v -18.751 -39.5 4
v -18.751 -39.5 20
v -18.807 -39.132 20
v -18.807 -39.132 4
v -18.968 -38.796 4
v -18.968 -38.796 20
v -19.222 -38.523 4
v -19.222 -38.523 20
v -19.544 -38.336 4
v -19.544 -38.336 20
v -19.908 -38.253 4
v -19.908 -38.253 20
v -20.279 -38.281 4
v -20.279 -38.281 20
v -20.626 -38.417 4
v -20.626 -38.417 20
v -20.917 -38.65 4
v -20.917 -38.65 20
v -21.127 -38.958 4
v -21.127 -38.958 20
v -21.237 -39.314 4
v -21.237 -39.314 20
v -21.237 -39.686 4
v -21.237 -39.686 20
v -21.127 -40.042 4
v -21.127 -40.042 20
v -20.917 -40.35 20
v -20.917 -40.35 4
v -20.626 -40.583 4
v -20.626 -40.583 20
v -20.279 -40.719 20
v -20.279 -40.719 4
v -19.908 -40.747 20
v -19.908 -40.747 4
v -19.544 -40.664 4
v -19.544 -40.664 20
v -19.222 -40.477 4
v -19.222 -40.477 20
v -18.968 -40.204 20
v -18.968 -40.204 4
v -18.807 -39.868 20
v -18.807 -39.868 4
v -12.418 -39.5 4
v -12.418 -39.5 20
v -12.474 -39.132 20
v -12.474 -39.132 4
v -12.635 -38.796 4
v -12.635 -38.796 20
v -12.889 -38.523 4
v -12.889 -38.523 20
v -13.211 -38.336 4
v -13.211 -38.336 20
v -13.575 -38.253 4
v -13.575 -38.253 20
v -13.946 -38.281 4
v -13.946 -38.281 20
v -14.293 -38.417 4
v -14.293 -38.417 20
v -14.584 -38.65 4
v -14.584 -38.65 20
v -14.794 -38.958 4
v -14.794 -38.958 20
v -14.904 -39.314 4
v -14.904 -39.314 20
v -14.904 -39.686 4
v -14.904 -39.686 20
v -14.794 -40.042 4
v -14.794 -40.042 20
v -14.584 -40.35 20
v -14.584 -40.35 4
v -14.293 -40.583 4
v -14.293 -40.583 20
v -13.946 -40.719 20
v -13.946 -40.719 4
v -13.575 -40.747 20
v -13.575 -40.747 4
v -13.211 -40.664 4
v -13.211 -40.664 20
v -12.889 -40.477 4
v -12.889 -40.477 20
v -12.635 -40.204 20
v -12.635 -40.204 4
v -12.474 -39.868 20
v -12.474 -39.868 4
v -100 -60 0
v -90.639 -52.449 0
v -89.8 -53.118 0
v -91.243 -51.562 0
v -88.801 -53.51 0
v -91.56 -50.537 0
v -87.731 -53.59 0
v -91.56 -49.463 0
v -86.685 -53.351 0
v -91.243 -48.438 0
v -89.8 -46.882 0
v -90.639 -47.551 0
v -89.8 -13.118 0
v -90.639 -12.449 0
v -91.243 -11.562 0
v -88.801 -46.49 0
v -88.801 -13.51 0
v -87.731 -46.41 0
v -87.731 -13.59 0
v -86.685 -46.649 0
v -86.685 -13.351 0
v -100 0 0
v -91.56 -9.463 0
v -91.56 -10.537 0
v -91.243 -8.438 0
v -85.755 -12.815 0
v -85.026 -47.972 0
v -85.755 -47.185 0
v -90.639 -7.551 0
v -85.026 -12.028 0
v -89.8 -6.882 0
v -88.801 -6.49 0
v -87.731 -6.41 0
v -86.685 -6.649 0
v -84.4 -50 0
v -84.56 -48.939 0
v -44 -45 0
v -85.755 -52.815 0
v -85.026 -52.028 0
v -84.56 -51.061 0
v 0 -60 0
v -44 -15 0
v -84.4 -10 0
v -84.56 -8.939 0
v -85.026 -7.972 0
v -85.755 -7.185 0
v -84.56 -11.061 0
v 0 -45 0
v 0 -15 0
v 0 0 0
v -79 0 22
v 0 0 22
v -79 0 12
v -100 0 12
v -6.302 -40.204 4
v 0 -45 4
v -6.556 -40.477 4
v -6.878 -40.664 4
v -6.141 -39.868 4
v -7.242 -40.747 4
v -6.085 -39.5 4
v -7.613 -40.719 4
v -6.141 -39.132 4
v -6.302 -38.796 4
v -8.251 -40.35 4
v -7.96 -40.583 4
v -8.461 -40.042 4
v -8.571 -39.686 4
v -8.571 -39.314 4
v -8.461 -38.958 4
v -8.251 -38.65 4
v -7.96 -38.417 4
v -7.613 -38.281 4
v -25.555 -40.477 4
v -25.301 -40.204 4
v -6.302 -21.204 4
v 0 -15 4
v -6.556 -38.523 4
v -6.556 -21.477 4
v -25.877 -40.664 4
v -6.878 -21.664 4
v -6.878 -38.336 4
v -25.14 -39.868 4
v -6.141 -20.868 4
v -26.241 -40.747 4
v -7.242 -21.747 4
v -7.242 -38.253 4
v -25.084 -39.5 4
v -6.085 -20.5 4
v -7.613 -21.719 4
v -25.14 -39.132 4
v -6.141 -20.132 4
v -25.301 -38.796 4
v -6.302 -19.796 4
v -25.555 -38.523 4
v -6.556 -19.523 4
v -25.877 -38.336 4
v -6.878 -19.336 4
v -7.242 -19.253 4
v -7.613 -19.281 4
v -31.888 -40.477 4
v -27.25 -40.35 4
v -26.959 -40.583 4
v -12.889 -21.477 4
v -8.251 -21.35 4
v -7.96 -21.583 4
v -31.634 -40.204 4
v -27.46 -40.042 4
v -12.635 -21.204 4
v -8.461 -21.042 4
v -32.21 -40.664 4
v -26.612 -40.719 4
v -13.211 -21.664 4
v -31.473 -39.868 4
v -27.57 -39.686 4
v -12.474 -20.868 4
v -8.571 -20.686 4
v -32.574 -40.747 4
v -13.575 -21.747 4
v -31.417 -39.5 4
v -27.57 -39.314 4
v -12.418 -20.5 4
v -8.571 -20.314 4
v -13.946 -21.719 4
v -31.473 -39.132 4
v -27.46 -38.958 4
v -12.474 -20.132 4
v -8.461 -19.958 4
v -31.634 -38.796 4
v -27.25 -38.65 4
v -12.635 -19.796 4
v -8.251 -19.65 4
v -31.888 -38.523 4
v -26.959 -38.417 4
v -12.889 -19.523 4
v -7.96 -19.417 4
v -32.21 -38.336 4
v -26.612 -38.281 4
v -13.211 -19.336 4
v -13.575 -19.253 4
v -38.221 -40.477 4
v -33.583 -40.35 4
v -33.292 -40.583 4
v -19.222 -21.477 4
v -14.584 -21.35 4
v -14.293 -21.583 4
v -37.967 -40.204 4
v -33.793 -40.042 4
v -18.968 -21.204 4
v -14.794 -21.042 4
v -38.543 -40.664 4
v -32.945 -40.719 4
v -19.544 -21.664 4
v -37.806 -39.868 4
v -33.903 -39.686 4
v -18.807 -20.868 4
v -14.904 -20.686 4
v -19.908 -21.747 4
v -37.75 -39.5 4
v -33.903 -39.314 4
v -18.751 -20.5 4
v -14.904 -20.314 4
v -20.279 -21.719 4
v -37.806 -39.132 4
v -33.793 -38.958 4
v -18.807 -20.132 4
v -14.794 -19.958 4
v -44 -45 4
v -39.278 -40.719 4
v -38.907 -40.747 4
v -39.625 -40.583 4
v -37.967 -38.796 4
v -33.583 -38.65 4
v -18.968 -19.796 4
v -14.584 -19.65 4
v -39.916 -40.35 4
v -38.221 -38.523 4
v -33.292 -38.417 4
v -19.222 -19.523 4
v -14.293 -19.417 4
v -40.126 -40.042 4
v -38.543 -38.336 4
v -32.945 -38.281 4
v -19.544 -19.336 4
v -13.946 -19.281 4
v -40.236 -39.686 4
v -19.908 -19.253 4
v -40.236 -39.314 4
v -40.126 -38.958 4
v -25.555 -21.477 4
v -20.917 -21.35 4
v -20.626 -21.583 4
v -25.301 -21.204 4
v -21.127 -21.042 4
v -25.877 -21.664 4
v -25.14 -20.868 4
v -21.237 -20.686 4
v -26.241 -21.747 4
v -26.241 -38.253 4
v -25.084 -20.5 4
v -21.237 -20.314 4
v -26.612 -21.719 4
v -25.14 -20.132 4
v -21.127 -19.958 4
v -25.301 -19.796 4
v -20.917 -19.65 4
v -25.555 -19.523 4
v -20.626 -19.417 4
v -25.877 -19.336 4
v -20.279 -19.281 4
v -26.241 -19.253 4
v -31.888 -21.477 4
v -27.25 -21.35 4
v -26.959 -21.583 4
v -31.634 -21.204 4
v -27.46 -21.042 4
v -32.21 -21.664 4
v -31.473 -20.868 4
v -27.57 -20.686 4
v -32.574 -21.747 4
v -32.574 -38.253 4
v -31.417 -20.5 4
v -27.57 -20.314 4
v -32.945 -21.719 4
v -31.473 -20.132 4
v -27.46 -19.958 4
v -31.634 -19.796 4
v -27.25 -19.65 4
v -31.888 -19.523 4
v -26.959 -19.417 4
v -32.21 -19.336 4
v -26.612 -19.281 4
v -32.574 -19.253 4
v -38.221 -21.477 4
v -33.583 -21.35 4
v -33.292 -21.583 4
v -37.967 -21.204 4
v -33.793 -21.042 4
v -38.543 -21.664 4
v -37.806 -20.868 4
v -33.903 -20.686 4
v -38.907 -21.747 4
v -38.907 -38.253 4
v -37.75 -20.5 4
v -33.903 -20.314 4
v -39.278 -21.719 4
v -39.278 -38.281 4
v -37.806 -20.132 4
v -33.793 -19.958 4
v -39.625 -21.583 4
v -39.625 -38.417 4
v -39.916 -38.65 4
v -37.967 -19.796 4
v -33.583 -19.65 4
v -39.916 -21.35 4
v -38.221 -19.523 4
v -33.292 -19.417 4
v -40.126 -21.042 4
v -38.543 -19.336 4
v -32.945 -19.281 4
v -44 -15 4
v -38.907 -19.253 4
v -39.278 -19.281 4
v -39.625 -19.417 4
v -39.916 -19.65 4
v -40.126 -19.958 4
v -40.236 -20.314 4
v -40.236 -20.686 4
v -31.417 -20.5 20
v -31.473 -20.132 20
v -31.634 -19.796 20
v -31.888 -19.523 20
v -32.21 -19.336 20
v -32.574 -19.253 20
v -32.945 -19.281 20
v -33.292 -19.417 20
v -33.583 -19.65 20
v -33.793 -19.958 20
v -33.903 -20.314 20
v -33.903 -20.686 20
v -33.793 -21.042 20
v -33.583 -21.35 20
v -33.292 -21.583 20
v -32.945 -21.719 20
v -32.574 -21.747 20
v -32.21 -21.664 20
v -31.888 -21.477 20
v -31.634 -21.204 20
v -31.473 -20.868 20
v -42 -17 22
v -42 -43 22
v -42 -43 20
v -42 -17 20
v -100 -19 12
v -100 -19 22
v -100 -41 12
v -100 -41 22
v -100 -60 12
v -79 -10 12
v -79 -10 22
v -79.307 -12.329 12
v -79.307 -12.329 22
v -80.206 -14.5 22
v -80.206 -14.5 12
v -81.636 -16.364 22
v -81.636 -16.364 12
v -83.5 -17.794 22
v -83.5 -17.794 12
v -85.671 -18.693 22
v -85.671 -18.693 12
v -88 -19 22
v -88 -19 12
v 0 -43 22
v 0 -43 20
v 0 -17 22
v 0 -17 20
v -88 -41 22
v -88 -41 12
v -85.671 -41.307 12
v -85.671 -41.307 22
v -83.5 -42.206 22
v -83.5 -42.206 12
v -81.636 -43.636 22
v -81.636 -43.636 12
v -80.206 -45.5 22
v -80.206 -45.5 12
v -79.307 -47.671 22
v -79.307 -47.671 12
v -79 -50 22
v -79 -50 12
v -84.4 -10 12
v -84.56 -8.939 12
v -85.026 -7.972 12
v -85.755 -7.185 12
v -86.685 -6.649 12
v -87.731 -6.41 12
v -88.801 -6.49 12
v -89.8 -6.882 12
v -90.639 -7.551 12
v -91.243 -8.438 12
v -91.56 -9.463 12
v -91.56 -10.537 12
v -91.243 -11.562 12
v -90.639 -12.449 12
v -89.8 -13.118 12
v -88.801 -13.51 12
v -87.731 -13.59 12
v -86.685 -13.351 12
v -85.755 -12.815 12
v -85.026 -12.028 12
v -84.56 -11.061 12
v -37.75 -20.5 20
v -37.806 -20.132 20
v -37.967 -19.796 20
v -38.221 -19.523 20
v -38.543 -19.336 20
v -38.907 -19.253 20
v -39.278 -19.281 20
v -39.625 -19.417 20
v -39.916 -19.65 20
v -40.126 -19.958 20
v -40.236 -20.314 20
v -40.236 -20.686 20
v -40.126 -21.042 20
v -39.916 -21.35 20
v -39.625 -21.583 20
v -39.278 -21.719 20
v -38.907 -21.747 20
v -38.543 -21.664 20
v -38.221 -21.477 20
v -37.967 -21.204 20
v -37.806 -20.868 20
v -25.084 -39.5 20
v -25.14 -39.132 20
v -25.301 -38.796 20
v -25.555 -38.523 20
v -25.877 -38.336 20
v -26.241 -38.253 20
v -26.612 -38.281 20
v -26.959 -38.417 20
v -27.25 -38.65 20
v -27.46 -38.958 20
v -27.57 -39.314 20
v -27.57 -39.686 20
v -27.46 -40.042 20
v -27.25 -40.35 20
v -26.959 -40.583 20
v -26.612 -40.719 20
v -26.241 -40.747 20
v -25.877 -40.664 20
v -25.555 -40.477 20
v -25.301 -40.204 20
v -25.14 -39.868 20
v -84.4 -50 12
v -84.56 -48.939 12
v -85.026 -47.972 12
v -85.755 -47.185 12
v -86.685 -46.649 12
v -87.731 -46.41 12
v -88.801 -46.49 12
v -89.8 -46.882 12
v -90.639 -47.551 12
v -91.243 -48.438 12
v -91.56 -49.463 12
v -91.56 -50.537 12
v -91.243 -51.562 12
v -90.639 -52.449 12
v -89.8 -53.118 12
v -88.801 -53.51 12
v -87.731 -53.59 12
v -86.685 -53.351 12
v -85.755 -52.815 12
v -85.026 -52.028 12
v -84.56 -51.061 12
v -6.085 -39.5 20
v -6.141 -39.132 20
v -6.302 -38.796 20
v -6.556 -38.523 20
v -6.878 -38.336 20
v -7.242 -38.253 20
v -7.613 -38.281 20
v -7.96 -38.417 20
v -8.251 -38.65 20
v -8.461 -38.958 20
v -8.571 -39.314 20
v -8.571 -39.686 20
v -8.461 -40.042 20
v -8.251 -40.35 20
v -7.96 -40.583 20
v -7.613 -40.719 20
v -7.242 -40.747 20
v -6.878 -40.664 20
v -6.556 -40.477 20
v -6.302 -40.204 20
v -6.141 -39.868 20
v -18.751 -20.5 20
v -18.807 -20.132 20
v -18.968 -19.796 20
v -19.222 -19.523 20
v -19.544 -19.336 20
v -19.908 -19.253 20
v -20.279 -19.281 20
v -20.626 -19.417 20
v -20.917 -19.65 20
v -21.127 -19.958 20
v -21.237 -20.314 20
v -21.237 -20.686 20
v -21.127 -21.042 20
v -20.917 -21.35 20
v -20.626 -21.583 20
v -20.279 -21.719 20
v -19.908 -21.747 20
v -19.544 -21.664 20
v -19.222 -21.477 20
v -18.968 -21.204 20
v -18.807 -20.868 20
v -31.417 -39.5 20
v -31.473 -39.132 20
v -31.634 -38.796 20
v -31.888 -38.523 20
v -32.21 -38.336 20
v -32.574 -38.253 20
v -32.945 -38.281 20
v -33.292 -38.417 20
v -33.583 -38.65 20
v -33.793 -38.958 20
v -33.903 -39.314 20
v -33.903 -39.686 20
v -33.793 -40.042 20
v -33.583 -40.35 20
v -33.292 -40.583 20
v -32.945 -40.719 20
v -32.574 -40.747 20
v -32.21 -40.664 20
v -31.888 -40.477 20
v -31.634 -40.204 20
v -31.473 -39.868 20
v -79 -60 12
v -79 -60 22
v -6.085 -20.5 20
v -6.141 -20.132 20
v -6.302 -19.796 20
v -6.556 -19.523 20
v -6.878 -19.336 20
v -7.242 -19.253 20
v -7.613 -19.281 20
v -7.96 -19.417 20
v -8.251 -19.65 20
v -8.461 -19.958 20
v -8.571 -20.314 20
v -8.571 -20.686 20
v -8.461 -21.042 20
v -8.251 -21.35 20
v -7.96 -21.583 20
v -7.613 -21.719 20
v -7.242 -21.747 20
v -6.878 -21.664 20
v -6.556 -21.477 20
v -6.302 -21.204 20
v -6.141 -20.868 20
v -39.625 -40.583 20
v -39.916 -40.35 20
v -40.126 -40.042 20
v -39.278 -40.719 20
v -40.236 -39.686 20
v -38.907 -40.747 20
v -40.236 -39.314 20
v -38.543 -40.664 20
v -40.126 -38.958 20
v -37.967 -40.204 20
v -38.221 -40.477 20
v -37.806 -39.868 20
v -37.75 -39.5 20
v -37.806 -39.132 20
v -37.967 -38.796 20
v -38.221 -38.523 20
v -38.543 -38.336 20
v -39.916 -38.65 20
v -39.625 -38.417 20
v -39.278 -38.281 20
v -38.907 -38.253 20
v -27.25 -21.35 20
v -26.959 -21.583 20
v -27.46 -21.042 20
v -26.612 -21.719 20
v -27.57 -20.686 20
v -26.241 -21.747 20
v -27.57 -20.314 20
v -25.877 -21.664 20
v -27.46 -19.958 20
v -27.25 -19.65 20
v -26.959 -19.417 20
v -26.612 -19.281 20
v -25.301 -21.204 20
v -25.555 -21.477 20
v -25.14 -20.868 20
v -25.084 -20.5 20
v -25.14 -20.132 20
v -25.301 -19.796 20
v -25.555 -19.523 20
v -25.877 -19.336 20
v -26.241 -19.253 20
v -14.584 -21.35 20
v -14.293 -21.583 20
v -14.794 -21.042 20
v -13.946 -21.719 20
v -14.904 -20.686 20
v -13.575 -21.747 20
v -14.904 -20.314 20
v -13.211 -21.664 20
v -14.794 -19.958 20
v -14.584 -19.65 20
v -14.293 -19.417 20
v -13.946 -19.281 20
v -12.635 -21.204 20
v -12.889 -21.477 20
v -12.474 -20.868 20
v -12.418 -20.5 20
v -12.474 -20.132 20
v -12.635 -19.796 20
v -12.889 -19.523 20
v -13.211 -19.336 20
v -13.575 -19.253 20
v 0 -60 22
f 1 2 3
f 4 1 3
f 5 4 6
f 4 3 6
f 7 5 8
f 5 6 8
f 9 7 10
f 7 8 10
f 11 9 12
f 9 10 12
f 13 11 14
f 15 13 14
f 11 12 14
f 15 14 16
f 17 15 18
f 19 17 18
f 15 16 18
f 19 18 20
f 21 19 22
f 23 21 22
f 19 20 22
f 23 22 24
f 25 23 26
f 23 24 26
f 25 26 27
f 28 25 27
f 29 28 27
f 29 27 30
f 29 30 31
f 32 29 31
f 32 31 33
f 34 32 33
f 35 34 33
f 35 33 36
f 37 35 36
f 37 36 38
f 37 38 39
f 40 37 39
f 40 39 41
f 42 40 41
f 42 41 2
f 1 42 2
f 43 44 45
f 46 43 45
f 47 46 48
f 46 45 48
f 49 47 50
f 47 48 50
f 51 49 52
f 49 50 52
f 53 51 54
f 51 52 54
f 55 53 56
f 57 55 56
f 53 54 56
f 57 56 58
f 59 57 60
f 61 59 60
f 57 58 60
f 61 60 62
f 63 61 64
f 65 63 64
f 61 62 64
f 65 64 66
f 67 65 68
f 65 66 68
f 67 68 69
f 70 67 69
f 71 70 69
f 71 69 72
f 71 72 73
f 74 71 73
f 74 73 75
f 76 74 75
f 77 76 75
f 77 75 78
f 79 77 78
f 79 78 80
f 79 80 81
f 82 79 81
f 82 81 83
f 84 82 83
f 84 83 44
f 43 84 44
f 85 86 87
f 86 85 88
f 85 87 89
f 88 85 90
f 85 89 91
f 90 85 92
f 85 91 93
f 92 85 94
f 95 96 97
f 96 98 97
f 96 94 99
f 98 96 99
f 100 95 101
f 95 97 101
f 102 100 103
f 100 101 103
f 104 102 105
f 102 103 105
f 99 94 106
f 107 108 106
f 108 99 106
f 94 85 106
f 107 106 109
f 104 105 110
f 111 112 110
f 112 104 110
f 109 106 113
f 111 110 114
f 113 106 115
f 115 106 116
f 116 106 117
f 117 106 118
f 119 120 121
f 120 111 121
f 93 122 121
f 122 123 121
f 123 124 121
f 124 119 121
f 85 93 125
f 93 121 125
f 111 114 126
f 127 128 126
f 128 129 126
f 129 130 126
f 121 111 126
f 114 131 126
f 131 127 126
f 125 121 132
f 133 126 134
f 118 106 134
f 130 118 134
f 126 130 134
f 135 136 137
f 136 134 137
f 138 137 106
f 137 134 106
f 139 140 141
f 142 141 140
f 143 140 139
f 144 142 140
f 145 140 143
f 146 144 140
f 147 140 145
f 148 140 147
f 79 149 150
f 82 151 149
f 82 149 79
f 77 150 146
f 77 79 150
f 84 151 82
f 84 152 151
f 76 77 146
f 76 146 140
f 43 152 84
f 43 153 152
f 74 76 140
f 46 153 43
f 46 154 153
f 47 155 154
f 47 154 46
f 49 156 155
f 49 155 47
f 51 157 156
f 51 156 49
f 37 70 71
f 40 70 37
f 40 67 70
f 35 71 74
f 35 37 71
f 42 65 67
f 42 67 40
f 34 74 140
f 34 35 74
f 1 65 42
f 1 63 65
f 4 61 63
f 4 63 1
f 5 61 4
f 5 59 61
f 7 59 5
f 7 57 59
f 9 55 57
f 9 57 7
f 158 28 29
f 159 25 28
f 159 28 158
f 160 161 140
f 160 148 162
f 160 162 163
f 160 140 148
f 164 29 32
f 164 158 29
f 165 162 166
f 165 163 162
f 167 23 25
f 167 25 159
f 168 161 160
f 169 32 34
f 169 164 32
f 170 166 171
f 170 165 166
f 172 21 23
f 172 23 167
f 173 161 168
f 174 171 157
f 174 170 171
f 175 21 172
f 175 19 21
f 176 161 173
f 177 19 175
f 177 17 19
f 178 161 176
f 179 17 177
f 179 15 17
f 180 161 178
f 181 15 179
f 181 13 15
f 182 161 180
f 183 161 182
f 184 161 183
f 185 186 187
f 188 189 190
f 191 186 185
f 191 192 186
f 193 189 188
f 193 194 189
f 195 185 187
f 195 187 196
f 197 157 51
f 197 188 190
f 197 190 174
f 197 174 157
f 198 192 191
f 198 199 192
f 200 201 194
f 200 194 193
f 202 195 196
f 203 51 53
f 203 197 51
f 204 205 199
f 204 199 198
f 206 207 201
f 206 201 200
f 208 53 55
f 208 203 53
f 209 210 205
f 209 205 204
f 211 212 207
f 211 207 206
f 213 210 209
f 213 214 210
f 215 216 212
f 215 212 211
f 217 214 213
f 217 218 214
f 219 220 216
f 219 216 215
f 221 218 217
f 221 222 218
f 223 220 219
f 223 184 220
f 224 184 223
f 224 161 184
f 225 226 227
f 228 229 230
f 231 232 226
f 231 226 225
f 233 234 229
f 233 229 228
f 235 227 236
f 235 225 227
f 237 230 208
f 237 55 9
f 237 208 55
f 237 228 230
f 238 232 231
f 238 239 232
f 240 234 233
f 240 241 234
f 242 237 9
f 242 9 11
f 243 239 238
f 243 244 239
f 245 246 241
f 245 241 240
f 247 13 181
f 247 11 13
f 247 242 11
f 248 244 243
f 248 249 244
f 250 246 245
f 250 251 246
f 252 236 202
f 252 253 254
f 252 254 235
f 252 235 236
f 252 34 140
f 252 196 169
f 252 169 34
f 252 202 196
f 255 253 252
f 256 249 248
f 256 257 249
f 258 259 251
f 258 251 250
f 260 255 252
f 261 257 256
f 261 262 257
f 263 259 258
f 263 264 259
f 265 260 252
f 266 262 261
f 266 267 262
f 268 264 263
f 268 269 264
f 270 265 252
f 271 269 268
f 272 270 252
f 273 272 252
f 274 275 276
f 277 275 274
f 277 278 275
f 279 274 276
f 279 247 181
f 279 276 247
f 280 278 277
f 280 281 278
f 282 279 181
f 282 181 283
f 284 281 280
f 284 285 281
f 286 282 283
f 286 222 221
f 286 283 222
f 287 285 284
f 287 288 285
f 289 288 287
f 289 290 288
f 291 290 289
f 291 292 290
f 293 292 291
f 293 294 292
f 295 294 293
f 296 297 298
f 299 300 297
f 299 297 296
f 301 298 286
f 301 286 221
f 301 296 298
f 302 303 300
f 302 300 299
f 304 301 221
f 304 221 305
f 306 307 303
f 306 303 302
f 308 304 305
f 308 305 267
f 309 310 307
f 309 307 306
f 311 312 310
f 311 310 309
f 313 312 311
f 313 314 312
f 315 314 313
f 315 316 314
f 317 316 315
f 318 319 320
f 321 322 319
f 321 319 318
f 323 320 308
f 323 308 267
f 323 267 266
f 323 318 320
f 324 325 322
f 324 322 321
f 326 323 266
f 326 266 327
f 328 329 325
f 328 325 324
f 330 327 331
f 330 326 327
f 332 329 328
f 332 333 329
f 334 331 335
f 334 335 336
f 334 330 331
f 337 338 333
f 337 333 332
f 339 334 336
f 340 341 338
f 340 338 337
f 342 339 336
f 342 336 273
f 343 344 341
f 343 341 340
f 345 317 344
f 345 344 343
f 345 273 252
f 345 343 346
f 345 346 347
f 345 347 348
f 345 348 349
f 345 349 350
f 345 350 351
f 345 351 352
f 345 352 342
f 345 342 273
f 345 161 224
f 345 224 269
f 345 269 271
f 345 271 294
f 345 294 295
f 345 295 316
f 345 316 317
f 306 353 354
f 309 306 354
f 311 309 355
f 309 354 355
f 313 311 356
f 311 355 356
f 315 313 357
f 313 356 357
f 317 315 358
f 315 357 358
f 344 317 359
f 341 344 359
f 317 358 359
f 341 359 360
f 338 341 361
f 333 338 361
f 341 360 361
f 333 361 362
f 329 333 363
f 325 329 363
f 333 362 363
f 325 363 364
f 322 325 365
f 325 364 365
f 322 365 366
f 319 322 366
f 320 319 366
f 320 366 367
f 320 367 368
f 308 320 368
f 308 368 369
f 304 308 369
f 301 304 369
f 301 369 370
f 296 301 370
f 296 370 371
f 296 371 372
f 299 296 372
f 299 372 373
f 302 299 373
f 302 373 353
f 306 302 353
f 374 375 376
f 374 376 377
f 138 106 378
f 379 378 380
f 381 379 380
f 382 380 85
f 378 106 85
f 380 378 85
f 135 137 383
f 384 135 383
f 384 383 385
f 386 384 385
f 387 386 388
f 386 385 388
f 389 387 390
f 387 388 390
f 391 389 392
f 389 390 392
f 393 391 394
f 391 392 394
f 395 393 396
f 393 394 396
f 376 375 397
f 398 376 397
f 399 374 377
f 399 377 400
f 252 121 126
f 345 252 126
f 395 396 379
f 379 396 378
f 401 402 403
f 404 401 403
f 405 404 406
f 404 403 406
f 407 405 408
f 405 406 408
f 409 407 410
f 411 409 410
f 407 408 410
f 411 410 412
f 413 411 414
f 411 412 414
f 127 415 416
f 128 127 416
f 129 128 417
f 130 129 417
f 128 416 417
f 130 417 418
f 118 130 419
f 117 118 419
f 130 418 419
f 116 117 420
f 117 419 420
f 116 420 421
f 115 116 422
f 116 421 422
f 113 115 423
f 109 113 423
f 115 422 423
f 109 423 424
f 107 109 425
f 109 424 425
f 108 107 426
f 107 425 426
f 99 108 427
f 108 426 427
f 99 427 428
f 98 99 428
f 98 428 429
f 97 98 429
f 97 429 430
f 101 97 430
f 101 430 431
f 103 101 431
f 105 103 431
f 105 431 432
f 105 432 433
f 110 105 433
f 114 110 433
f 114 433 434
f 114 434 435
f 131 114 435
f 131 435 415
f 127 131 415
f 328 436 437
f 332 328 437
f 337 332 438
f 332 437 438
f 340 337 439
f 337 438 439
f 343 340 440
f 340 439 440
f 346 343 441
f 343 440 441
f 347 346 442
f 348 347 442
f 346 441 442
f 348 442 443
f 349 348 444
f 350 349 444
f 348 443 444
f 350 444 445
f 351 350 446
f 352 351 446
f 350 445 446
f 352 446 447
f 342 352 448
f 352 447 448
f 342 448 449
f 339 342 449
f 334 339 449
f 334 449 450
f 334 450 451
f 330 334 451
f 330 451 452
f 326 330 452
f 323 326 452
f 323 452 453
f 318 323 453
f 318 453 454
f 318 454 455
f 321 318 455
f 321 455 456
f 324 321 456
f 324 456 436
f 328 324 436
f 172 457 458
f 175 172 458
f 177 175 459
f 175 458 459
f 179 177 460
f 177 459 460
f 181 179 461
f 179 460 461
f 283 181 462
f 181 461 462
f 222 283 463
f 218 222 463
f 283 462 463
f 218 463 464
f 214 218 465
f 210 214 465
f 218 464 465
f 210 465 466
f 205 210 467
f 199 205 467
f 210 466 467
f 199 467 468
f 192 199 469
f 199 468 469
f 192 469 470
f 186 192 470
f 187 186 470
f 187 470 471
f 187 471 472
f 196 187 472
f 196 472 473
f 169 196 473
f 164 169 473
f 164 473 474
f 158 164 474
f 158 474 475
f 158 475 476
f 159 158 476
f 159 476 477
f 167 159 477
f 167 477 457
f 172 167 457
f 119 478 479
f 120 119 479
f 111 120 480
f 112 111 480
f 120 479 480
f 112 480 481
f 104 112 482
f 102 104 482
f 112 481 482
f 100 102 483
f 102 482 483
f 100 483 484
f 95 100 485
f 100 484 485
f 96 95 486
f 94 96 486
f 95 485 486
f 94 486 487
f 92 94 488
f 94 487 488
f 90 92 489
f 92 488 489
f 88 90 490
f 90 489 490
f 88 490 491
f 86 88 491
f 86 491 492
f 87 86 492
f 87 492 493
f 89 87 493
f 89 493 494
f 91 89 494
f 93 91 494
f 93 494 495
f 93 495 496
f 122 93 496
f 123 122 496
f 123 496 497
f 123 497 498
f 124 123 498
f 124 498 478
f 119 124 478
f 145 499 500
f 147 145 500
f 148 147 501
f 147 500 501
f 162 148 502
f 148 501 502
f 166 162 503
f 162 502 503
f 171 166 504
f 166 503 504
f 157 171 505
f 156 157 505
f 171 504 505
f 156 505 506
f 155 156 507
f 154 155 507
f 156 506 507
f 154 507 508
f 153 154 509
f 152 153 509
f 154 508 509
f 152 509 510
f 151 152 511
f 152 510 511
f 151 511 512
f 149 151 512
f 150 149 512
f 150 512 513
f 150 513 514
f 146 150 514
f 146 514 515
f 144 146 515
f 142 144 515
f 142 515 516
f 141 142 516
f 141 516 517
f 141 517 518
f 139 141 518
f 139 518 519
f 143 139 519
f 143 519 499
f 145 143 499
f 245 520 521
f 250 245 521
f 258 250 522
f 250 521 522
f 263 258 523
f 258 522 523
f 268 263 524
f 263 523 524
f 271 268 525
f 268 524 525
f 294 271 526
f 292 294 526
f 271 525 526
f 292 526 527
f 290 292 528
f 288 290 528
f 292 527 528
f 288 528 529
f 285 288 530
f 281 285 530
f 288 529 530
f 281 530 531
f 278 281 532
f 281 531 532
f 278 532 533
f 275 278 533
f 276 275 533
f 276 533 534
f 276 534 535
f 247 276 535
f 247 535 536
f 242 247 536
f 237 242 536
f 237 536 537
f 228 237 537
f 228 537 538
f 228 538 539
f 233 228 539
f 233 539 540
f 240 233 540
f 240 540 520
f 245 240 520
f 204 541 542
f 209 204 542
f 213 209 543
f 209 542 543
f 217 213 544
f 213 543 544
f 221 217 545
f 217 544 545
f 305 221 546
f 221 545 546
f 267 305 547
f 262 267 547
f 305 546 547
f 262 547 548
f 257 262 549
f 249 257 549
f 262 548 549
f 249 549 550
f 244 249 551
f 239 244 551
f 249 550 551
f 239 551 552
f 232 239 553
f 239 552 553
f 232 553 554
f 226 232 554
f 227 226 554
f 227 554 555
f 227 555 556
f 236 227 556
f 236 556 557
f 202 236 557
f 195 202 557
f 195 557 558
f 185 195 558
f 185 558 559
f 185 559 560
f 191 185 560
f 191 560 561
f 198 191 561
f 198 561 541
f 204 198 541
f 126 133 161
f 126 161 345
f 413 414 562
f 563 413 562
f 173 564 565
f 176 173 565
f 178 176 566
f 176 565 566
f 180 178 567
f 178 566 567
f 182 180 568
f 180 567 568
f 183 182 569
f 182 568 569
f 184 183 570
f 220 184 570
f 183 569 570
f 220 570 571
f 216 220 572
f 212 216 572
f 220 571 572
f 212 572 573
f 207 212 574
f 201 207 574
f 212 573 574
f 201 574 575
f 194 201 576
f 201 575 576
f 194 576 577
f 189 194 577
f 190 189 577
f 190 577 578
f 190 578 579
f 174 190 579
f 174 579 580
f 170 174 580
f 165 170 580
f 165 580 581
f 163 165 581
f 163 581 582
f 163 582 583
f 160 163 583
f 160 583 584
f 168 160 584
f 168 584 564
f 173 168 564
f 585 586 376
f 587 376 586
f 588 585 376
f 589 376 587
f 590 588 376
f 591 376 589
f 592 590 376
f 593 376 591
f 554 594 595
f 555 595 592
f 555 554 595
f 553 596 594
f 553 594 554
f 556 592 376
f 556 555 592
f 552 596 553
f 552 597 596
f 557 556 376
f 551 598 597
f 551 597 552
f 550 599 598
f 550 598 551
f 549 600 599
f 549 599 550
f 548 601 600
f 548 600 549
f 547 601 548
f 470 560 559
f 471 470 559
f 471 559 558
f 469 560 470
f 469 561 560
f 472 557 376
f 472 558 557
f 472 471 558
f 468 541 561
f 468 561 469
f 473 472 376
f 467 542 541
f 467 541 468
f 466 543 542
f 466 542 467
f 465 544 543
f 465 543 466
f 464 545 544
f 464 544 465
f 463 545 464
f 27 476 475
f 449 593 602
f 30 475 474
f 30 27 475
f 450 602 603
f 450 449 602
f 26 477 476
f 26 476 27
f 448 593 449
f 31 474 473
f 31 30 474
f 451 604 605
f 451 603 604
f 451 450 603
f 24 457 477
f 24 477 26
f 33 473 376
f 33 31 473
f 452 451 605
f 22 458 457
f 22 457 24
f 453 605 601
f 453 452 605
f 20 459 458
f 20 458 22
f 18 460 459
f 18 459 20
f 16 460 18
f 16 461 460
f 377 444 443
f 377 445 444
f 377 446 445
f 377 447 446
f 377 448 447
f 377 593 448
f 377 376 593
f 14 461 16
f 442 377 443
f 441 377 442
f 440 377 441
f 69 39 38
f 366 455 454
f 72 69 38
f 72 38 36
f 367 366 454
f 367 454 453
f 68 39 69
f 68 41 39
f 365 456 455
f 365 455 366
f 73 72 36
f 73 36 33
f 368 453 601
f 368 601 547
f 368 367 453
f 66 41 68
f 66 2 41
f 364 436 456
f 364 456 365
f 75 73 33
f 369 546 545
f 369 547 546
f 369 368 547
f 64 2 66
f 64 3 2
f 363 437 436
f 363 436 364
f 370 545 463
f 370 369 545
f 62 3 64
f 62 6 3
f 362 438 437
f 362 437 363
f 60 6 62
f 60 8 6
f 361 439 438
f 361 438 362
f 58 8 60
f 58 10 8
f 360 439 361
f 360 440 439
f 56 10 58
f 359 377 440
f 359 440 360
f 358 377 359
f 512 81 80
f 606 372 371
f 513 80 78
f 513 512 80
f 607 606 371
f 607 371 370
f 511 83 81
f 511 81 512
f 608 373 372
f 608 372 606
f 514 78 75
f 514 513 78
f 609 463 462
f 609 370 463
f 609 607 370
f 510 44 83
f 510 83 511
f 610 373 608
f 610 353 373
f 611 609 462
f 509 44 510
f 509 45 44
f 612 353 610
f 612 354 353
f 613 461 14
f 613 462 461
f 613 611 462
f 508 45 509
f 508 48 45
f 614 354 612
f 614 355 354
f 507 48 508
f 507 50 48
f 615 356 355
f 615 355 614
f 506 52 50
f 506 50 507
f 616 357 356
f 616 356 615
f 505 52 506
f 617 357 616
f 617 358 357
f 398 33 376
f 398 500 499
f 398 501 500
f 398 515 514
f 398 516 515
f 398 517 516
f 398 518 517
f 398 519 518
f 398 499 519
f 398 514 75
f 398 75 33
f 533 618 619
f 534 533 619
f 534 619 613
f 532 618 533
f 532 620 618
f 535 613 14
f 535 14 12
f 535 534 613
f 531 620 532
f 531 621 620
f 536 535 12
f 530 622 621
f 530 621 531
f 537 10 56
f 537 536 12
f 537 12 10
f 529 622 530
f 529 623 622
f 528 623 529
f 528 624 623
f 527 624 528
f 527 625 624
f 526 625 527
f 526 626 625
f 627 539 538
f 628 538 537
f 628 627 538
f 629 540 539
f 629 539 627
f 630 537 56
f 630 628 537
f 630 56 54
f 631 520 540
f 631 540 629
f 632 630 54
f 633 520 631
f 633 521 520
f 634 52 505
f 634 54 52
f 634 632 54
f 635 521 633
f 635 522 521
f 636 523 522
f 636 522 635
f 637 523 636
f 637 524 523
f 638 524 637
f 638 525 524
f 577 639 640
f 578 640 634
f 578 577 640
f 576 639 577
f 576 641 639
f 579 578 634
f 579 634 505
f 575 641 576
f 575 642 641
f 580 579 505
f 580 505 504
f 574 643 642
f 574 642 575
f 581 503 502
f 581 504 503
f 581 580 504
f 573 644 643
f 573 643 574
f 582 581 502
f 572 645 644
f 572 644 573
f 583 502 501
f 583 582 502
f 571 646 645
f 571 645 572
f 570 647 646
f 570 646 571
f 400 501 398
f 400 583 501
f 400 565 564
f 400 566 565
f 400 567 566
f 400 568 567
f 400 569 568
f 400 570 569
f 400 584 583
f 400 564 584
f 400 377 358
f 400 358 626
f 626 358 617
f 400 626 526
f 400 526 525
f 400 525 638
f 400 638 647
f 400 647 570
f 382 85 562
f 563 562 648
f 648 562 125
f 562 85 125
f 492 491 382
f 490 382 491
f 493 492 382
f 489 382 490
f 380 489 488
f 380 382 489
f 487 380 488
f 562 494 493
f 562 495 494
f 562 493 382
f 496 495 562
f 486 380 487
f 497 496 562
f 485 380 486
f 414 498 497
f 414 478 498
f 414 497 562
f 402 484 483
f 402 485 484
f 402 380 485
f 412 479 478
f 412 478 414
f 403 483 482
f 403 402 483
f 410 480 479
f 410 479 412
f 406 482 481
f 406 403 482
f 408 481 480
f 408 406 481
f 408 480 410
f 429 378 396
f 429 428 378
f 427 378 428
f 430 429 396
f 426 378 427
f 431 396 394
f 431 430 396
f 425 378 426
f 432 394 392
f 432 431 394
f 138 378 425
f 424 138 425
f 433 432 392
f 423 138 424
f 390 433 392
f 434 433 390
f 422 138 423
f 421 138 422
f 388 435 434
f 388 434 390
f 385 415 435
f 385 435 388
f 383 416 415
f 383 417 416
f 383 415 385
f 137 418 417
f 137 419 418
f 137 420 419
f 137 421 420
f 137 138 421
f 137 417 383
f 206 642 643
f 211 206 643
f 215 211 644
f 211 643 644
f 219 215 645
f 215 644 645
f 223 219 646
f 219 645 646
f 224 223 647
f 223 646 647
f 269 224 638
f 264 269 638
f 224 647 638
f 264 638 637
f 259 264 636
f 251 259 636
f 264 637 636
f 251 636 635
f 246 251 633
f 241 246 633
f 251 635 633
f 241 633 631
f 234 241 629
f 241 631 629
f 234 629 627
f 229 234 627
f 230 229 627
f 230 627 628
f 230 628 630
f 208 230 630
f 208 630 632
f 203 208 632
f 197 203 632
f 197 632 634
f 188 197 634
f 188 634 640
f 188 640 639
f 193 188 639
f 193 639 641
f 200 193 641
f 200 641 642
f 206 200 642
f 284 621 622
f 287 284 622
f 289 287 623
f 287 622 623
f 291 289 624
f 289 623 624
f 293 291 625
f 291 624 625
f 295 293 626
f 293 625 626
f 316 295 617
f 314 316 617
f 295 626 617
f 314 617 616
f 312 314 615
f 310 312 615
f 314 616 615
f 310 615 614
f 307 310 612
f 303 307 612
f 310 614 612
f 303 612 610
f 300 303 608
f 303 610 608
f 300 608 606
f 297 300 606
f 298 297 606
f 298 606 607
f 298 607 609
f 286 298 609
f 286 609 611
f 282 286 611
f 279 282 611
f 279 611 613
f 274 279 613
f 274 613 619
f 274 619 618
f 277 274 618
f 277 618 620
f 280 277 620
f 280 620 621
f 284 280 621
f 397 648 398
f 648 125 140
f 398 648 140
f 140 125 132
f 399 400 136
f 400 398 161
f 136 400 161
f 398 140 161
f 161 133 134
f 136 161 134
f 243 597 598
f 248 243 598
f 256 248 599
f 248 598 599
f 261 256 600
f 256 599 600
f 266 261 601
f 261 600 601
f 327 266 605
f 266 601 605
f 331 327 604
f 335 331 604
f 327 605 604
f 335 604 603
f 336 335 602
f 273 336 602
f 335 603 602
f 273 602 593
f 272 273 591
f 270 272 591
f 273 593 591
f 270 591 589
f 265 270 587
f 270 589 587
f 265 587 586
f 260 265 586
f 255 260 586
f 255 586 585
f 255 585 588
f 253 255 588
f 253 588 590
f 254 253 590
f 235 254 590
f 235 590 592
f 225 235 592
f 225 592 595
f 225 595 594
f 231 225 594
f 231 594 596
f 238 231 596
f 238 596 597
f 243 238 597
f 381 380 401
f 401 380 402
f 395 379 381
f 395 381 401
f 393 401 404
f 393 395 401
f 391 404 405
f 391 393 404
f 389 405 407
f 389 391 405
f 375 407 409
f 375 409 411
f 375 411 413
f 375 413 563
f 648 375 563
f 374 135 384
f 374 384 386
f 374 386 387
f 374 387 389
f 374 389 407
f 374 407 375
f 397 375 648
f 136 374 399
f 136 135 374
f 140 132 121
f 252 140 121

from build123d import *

# Parameters (mm, degrees)
SKIZZE1_W                       = 100
SKIZZE1_H                       = 60
AUFSATZ_LINEAR_AUSTRAGEN1_DEPTH = 12
SKIZZE3_R                       = 3.6
SCHNITT_LINEAR_AUSTRAGEN2_DEPTH = 20
AUFSATZ_LINEAR_AUSTRAGEN2_DEPTH = 10
SKIZZE9_W                       = 42
SKIZZE9_H                       = 26
SCHNITT_LINEAR_AUSTRAGEN6_DEPTH = 2
SKIZZE10_W                      = 44
SKIZZE10_H                      = 30
SCHNITT_LINEAR_AUSTRAGEN7_DEPTH = 4
SKIZZE11_R                      = 1.25
SCHNITT_LINEAR_AUSTRAGEN8_DEPTH = 119.321595662


with BuildPart() as part:
    # Skizze1 → Aufsatz-Linear austragen1 (new body)
    with BuildSketch(Plane.XY):
        with Locations((-50, -30)):
            Rectangle(SKIZZE1_W, SKIZZE1_H)
    extrude(amount=AUFSATZ_LINEAR_AUSTRAGEN1_DEPTH)

    # Skizze3 → Schnitt-Linear austragen2 (cut)
    with BuildSketch(Plane.XY.offset(12)):
        with Locations((-88, -10)):
            Circle(SKIZZE3_R)
        with Locations((-88, -50)):
            Circle(SKIZZE3_R)
    extrude(amount=-SCHNITT_LINEAR_AUSTRAGEN2_DEPTH, mode=Mode.SUBTRACT)

    # Skizze5 → Aufsatz-Linear austragen2 (add)
    with BuildSketch(Plane.XY.offset(12)):
        with BuildLine():
            Line((-100, -41), (-88, -41))
            ThreePointArc((-88, -41), (-81.636038969, -43.636038969), (-79, -50))
            Line((-79, -50), (-79, -60))
            Line((-79, -60), (0, -60))
            Line((0, -60), (0, 0))
            Line((0, 0), (-79, 0))
            Line((-79, 0), (-79, -10))
            ThreePointArc((-79, -10), (-81.636038969, -16.363961031), (-88, -19))
            Line((-88, -19), (-100, -19))
            Line((-100, -19), (-100, -41))
        make_face()
    extrude(amount=AUFSATZ_LINEAR_AUSTRAGEN2_DEPTH)

    # Skizze9 → Schnitt-Linear austragen6 (cut)
    with BuildSketch(Plane.XY.offset(22)):
        with Locations((-21, -30)):
            Rectangle(SKIZZE9_W, SKIZZE9_H)
    extrude(amount=-SCHNITT_LINEAR_AUSTRAGEN6_DEPTH, mode=Mode.SUBTRACT)

    # Skizze10 → Schnitt-Linear austragen7 (cut)
    with BuildSketch(Plane(origin=(0, 0, 0), x_dir=(-1, 0, 0), z_dir=(0, 0, -1))):
        with Locations((22, -30)):
            Rectangle(SKIZZE10_W, SKIZZE10_H)
    extrude(amount=-SCHNITT_LINEAR_AUSTRAGEN7_DEPTH, mode=Mode.SUBTRACT)

    # Skizze11 → Schnitt-Linear austragen8 (cut, through all)
    with BuildSketch(Plane.XY.offset(20)):
        with Locations((-39, -20.5)):
            Circle(SKIZZE11_R)
        with Locations((-39, -39.5)):
            Circle(SKIZZE11_R)
        with Locations((-32.667, -20.5)):
            Circle(SKIZZE11_R)
        with Locations((-32.667, -39.5)):
            Circle(SKIZZE11_R)
        with Locations((-26.334, -20.5)):
            Circle(SKIZZE11_R)
        with Locations((-26.334, -39.5)):
            Circle(SKIZZE11_R)
        with Locations((-20.001, -20.5)):
            Circle(SKIZZE11_R)
        with Locations((-20.001, -39.5)):
            Circle(SKIZZE11_R)
        with Locations((-13.668, -20.5)):
            Circle(SKIZZE11_R)
        with Locations((-13.668, -39.5)):
            Circle(SKIZZE11_R)
        with Locations((-7.335, -20.5)):
            Circle(SKIZZE11_R)
        with Locations((-7.335, -39.5)):
            Circle(SKIZZE11_R)
    extrude(amount=-SCHNITT_LINEAR_AUSTRAGEN8_DEPTH, mode=Mode.SUBTRACT)


solid = part.part
